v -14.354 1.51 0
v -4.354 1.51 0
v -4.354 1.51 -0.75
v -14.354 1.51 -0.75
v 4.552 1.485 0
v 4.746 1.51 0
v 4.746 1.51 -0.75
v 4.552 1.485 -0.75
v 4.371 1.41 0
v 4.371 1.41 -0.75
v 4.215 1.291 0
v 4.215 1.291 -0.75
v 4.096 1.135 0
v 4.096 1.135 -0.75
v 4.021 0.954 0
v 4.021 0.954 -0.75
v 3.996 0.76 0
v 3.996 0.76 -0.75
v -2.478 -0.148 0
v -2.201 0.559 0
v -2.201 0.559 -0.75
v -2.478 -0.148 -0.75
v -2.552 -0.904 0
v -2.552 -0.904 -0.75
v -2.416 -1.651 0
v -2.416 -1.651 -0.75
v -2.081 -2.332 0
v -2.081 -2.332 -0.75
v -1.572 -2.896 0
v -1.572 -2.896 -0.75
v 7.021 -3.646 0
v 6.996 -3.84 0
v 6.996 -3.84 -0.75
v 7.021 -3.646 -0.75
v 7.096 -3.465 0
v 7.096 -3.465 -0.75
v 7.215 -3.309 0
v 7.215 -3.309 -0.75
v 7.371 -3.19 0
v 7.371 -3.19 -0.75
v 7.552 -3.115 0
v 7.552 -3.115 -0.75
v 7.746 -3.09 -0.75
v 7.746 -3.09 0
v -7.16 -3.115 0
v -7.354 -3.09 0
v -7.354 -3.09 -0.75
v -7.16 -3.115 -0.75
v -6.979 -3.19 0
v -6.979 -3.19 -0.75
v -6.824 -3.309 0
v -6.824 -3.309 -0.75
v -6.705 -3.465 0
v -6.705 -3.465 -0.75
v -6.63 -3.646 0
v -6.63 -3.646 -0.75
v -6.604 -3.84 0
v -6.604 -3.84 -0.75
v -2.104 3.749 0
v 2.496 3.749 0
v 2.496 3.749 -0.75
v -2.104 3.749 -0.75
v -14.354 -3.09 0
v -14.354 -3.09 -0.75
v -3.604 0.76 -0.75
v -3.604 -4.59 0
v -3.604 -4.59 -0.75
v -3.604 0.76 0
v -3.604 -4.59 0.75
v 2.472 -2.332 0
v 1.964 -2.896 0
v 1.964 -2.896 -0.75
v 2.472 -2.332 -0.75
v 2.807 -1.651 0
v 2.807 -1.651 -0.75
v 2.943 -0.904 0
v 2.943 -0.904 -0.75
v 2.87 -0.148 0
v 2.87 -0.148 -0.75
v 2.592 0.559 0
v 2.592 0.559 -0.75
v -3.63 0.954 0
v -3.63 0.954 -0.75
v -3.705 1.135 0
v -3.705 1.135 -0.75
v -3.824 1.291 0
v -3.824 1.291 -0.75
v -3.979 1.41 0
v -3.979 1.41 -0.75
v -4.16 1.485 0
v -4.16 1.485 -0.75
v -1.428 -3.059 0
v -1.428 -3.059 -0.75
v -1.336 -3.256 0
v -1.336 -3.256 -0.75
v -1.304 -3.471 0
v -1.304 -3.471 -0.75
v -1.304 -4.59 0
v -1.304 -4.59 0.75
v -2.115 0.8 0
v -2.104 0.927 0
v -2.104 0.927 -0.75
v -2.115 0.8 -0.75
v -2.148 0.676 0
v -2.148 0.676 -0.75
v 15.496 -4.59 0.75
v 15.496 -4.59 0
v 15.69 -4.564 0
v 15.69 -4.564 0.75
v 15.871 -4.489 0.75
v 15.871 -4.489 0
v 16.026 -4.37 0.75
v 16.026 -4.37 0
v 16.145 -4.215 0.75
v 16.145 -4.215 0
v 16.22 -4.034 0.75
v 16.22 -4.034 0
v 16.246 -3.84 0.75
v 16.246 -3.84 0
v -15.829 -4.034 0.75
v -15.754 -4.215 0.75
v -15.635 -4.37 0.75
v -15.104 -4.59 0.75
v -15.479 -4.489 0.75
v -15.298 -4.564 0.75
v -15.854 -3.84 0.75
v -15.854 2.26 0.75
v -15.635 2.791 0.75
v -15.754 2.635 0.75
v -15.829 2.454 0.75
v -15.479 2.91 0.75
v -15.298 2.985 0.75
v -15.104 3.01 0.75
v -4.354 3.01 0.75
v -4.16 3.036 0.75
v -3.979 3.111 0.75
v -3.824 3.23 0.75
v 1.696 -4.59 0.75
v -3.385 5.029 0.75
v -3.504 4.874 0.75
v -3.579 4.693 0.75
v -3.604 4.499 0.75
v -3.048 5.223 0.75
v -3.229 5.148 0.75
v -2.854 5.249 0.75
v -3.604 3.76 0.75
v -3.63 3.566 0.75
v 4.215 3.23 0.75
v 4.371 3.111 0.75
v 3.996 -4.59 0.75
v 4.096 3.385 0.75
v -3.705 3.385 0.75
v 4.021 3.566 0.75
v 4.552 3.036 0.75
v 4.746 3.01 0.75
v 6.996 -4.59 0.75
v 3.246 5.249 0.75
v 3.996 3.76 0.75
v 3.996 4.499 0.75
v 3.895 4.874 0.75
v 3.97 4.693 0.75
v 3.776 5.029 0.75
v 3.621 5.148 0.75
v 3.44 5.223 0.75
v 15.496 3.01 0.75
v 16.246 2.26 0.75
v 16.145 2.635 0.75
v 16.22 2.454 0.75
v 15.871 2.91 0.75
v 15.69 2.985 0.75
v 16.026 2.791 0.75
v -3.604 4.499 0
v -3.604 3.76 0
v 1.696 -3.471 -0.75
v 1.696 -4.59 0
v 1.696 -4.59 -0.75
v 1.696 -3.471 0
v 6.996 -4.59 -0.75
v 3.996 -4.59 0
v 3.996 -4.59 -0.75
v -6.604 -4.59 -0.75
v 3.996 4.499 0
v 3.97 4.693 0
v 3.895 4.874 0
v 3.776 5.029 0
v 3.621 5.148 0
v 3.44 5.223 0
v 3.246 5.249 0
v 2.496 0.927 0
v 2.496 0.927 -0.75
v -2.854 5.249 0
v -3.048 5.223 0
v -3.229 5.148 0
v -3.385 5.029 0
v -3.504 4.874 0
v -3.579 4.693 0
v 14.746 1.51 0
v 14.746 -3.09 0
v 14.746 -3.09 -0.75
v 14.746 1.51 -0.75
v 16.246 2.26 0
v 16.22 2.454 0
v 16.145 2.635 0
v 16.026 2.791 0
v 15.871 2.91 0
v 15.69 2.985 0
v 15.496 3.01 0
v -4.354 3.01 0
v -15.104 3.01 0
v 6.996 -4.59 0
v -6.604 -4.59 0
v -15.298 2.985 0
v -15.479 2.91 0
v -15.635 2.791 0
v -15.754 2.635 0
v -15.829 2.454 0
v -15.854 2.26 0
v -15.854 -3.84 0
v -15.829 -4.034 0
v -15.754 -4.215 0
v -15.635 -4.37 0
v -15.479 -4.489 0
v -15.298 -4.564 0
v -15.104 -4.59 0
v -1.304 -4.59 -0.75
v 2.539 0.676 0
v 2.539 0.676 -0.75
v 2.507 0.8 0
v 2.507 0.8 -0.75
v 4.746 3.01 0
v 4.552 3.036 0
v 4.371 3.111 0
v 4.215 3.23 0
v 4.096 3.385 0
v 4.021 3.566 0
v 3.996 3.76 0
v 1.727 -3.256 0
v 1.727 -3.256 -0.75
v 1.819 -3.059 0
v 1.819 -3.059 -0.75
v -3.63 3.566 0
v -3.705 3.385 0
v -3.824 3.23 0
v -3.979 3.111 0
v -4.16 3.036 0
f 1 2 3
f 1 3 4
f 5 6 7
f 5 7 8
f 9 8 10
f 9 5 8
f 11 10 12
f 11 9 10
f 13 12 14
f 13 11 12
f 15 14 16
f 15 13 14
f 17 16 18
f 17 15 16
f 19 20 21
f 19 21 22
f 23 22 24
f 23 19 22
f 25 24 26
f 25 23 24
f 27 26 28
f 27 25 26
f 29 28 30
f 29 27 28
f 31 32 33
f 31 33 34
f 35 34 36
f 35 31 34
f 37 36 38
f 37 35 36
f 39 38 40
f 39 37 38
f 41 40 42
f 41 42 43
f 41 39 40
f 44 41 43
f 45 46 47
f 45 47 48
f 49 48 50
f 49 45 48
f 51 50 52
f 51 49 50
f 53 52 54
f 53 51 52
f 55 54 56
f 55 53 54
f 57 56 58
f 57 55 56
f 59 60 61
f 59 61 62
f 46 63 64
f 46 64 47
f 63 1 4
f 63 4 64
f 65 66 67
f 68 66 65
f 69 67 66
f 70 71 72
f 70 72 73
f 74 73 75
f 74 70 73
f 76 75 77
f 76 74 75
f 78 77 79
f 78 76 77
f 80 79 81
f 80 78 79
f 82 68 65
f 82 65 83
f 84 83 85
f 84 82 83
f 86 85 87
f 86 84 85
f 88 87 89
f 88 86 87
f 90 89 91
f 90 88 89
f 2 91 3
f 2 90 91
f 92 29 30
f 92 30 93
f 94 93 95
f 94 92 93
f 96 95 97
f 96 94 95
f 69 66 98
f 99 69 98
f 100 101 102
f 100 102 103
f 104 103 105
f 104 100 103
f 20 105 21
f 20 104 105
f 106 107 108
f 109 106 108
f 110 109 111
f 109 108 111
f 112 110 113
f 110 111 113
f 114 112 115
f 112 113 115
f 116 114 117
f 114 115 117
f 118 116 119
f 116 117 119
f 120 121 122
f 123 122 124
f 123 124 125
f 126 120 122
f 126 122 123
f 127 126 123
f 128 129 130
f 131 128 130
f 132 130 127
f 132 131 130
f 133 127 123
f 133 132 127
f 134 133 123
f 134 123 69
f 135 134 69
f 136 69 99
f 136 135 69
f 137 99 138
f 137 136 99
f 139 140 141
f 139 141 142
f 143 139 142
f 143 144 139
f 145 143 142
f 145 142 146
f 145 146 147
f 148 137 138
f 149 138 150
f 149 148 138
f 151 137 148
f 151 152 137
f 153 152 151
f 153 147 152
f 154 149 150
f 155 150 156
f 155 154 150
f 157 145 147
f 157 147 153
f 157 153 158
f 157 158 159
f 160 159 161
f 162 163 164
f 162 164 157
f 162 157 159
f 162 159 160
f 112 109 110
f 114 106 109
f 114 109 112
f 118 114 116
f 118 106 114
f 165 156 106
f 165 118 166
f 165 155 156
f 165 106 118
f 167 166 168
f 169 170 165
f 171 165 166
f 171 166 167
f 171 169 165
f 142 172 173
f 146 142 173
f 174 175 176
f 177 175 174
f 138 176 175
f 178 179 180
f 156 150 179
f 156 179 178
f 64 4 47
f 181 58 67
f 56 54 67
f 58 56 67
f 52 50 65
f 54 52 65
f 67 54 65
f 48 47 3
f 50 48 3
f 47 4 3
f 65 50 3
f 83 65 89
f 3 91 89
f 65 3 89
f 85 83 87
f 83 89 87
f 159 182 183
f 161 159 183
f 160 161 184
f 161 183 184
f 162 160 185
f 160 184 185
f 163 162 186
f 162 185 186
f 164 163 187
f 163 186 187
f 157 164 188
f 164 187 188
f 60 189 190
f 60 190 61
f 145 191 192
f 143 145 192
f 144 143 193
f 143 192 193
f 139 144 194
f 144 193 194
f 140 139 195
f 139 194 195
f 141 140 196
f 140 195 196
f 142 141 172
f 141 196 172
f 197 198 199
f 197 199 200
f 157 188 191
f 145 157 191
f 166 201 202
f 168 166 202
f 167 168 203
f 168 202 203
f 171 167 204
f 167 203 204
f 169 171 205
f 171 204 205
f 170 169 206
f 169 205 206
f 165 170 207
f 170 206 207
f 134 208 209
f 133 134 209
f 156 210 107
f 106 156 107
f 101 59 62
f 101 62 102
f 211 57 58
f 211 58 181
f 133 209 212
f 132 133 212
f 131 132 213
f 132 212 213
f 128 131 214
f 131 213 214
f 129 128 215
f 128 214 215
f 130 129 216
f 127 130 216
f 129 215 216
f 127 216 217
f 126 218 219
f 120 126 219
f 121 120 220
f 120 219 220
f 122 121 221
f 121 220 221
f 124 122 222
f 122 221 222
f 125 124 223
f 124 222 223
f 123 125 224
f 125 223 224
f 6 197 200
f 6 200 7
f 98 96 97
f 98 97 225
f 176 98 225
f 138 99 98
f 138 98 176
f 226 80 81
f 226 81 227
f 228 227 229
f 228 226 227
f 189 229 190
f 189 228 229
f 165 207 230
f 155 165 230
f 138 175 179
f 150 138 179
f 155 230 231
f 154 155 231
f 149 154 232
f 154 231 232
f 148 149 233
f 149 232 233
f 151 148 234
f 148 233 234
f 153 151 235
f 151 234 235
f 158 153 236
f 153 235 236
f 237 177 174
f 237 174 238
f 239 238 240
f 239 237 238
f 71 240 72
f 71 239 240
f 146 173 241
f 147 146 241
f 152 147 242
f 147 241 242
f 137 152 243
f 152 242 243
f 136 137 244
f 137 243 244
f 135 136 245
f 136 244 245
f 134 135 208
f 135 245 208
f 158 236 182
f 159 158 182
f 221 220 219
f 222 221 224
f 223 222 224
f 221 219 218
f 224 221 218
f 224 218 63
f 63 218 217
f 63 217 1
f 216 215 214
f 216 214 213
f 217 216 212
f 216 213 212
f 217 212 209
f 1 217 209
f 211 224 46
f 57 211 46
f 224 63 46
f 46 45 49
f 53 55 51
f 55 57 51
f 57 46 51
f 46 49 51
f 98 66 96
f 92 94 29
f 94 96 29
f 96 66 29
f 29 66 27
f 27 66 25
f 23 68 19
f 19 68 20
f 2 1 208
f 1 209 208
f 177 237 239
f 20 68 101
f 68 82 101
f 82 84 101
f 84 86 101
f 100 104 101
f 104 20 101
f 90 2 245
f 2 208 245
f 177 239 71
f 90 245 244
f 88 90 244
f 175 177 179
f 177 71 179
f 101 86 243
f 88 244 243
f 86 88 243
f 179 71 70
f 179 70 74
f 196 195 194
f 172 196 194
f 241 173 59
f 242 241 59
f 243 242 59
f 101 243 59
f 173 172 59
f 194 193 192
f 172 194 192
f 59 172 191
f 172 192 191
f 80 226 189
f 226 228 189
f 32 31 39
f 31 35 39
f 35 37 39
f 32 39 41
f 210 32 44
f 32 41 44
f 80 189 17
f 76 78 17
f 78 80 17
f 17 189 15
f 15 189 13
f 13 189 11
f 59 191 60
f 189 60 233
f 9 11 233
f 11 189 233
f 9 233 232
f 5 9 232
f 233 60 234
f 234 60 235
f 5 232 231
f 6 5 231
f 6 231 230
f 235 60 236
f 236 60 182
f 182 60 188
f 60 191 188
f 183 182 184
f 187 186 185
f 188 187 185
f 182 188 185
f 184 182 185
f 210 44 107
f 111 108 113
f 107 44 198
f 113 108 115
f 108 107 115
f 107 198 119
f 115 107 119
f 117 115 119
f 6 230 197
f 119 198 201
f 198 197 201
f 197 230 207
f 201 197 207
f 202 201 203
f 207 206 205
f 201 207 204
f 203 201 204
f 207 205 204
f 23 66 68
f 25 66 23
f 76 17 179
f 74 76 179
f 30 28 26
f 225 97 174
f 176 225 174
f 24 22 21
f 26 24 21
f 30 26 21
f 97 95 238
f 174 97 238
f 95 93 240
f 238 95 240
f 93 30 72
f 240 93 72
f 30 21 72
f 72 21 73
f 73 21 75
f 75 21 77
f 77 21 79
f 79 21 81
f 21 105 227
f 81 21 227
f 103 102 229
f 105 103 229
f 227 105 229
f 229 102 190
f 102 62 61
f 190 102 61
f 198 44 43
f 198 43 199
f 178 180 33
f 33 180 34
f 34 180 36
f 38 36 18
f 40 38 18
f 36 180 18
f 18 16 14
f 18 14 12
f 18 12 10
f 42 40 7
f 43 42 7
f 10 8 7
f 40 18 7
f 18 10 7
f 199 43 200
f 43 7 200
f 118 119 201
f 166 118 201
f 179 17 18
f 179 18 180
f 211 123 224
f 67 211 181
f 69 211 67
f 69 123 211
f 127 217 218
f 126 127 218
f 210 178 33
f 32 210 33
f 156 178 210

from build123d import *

# Parameters (mm, degrees)
F1_DEPTH = 0.75
F2_DEPTH = 0.75


# Not quite as in the source:
# - ends of sketch curves that miss each other by under 0.0002 mm in the source are joined


with BuildPart() as f1:
    # F0 (on Top) → F1 (new body)
    with BuildSketch(Plane.XY):
        with BuildLine():
            Line((-4.3542903055, 3.0103204122), (-15.1042902548, 3.0103204122))
            ThreePointArc((-15.1042902548, 3.0103204122), (-15.634620706, 2.7906503467), (-15.8542907714, 2.2603198956))
            Line((-15.8542907714, 2.2603198956), (-15.8542907714, -3.8396952234))
            ThreePointArc((-15.8542907714, -3.8396952234), (-15.634620706, -4.3700256746), (-15.1042902548, -4.58969574))
            Line((-15.1042902548, -4.58969574), (-6.6042903055, -4.58969574))
            Line((-6.6042903055, -4.58969574), (-6.6042903055, -3.8396876639))
            ThreePointArc((-6.6042903055, -3.8396876639), (-6.8239602196, -3.309357578), (-7.3542903055, -3.0896876639))
            Line((-7.3542903055, -3.0896876639), (-14.3542907714, -3.0896876639))
            Line((-14.3542907714, -3.0896876639), (-14.3542907714, 1.5103194803))
            Line((-14.3542907714, 1.5103194803), (-4.3542898395, 1.5103132679))
            ThreePointArc((-4.3542898395, 1.5103132679), (-3.8239600548, 1.2906431891), (-3.6042903055, 0.7603132679))
            Line((-3.6042903055, 0.7603132679), (-3.6042903055, -4.5896876639))
            Line((-3.6042903055, -4.5896876639), (-1.3042907714, -4.58969574))
            Line((-1.3042907714, -4.58969574), (-1.3042907714, -3.4706392285))
            ThreePointArc((-1.3042907714, -3.4706392285), (-1.3745455835, -3.153706188), (-1.5721480592, -2.8961492966))
            ThreePointArc((-1.5721480592, -2.8961492966), (-2.5098893785, -1.2818626098), (-2.2007190289, 0.5592495498))
            ThreePointArc((-2.2007190289, 0.5592495498), (-2.1287979009, 0.7369818479), (-2.1042903055, 0.9271417706))
            Line((-2.1042903055, 0.9271417706), (-2.1042903055, 3.7487632608))
            Line((-2.1042903055, 3.7487632608), (2.4957087627, 3.7487632608))
            Line((2.4957087627, 3.7487632608), (2.4957087627, 0.9271417706))
            ThreePointArc((2.4957087627, 0.9271417706), (2.5202163581, 0.7369818479), (2.5921374862, 0.5592495498))
            ThreePointArc((2.5921374862, 0.5592495498), (2.9013078357, -1.2818626098), (1.9635665164, -2.8961492966))
            ThreePointArc((1.9635665164, -2.8961492966), (1.7659640407, -3.153706188), (1.6957092286, -3.4706392285))
            Line((1.6957092286, -3.4706392285), (1.6957092286, -4.5896876639))
            Line((1.6957092286, -4.5896876639), (3.9957149822, -4.58969574))
            Line((3.9957149822, -4.58969574), (3.9957116586, 0.7603127188))
            ThreePointArc((3.9957116586, 0.7603127188), (4.2153814061, 1.290643318), (4.7457117418, 1.5103137014))
            Line((4.7457117418, 1.5103137014), (14.7457092286, 1.5103194803))
            Line((14.7457092286, 1.5103194803), (14.7457092286, -3.0896876639))
            Line((14.7457092286, -3.0896876639), (7.7457154989, -3.0896876639))
            ThreePointArc((7.7457154989, -3.0896876639), (7.2153850477, -3.3093577293), (6.9957149822, -3.8396881805))
            Line((6.9957149822, -3.8396881805), (6.9957149822, -4.5896876639))
            Line((6.9957149822, -4.5896876639), (15.495708712, -4.58969574))
            ThreePointArc((15.495708712, -4.58969574), (16.0260391632, -4.3700256746), (16.2457092286, -3.8396952234))
            Line((16.2457092286, -3.8396952234), (16.2457092286, 2.2603198956))
            ThreePointArc((16.2457092286, 2.2603198956), (16.0260391632, 2.7906503467), (15.495708712, 3.0103204122))
            Line((15.495708712, 3.0103204122), (4.7457149822, 3.0103204122))
            ThreePointArc((4.7457149822, 3.0103204122), (4.2153848964, 3.2299903263), (3.9957149822, 3.7603204122))
            Line((3.9957149822, 3.7603204122), (3.9957149822, 4.4987632608))
            ThreePointArc((3.9957149822, 4.4987632608), (3.7760450681, 5.0290933467), (3.2457149822, 5.2487632608))
            Line((3.2457149822, 5.2487632608), (-2.8542903055, 5.2487632608))
            ThreePointArc((-2.8542903055, 5.2487632608), (-3.3846203913, 5.0290933467), (-3.6042903055, 4.4987632608))
            Line((-3.6042903055, 4.4987632608), (-3.6042903055, 3.7603204122))
            ThreePointArc((-3.6042903055, 3.7603204122), (-3.8239602196, 3.2299903263), (-4.3542903055, 3.0103204122))
        make_face()
        with BuildLine():
            Line((-6.6042903055, -3.8396876639), (-6.6042903055, -4.58969574))
            Line((-6.6042903055, -4.58969574), (-3.6042903055, -4.58969574))
            Line((-3.6042903055, -4.58969574), (-3.6042903055, 0.7603132679))
            ThreePointArc((-3.6042903055, 0.7603132679), (-3.8239600548, 1.2906431891), (-4.3542898395, 1.5103132679))
            Line((-4.3542898395, 1.5103132679), (-14.3542907714, 1.5103194803))
            Line((-14.3542907714, 1.5103194803), (-14.3542907714, -3.0896876639))
            Line((-14.3542907714, -3.0896876639), (-7.3542903055, -3.0896876639))
            ThreePointArc((-7.3542903055, -3.0896876639), (-6.8239602196, -3.309357578), (-6.6042903055, -3.8396876639))
        make_face()
        with BuildLine():
            Line((3.9957116586, 0.7603127188), (3.9957149822, -4.5896876639))
            Line((3.9957149822, -4.5896876639), (6.9957149822, -4.58969574))
            Line((6.9957149822, -4.58969574), (6.9957149822, -3.8396881805))
            ThreePointArc((6.9957149822, -3.8396881805), (7.2153850477, -3.3093577293), (7.7457154989, -3.0896876639))
            Line((7.7457154989, -3.0896876639), (14.7457092286, -3.0896876639))
            Line((14.7457092286, -3.0896876639), (14.7457092286, 1.5103194803))
            Line((14.7457092286, 1.5103194803), (4.7457117418, 1.5103137014))
            ThreePointArc((4.7457117418, 1.5103137014), (4.2153814061, 1.290643318), (3.9957116586, 0.7603127188))
        make_face()
        with BuildLine():
            Line((-1.3042907714, -3.4706392285), (-1.3042907714, -4.5896876639))
            Line((-1.3042907714, -4.5896876639), (1.6957092286, -4.58969574))
            Line((1.6957092286, -4.58969574), (1.6957092286, -3.4706392285))
            ThreePointArc((1.6957092286, -3.4706392285), (1.7659640407, -3.153706188), (1.9635665164, -2.8961492966))
            ThreePointArc((1.9635665164, -2.8961492966), (2.9013078357, -1.2818626098), (2.5921374862, 0.5592495498))
            ThreePointArc((2.5921374862, 0.5592495498), (2.5202163581, 0.7369818479), (2.4957087627, 0.9271417706))
            Line((2.4957087627, 0.9271417706), (2.4957087627, 3.7487632608))
            Line((2.4957087627, 3.7487632608), (-2.1042903055, 3.7487632608))
            Line((-2.1042903055, 3.7487632608), (-2.1042903055, 0.9271417706))
            ThreePointArc((-2.1042903055, 0.9271417706), (-2.1287979009, 0.7369818479), (-2.2007190289, 0.5592495498))
            ThreePointArc((-2.2007190289, 0.5592495498), (-2.5098893785, -1.2818626098), (-1.5721480592, -2.8961492966))
            ThreePointArc((-1.5721480592, -2.8961492966), (-1.3745455835, -3.153706188), (-1.3042907714, -3.4706392285))
        make_face()
    extrude(amount=F1_DEPTH)

    # F0 (on Top) → F2 (join)
    with BuildSketch(Plane.XY):
        with BuildLine():
            Line((-6.6042903055, -3.8396876639), (-6.6042903055, -4.58969574))
            Line((-6.6042903055, -4.58969574), (-3.6042903055, -4.58969574))
            Line((-3.6042903055, -4.58969574), (-3.6042903055, 0.7603132679))
            ThreePointArc((-3.6042903055, 0.7603132679), (-3.8239600548, 1.2906431891), (-4.3542898395, 1.5103132679))
            Line((-4.3542898395, 1.5103132679), (-14.3542907714, 1.5103194803))
            Line((-14.3542907714, 1.5103194803), (-14.3542907714, -3.0896876639))
            Line((-14.3542907714, -3.0896876639), (-7.3542903055, -3.0896876639))
            ThreePointArc((-7.3542903055, -3.0896876639), (-6.8239602196, -3.309357578), (-6.6042903055, -3.8396876639))
        make_face()
        with BuildLine():
            Line((-1.3042907714, -3.4706392285), (-1.3042907714, -4.5896876639))
            Line((-1.3042907714, -4.5896876639), (1.6957092286, -4.58969574))
            Line((1.6957092286, -4.58969574), (1.6957092286, -3.4706392285))
            ThreePointArc((1.6957092286, -3.4706392285), (1.7659640407, -3.153706188), (1.9635665164, -2.8961492966))
            ThreePointArc((1.9635665164, -2.8961492966), (2.9013078357, -1.2818626098), (2.5921374862, 0.5592495498))
            ThreePointArc((2.5921374862, 0.5592495498), (2.5202163581, 0.7369818479), (2.4957087627, 0.9271417706))
            Line((2.4957087627, 0.9271417706), (2.4957087627, 3.7487632608))
            Line((2.4957087627, 3.7487632608), (-2.1042903055, 3.7487632608))
            Line((-2.1042903055, 3.7487632608), (-2.1042903055, 0.9271417706))
            ThreePointArc((-2.1042903055, 0.9271417706), (-2.1287979009, 0.7369818479), (-2.2007190289, 0.5592495498))
            ThreePointArc((-2.2007190289, 0.5592495498), (-2.5098893785, -1.2818626098), (-1.5721480592, -2.8961492966))
            ThreePointArc((-1.5721480592, -2.8961492966), (-1.3745455835, -3.153706188), (-1.3042907714, -3.4706392285))
        make_face()
        with BuildLine():
            Line((3.9957116586, 0.7603127188), (3.9957149822, -4.5896876639))
            Line((3.9957149822, -4.5896876639), (6.9957149822, -4.58969574))
            Line((6.9957149822, -4.58969574), (6.9957149822, -3.8396881805))
            ThreePointArc((6.9957149822, -3.8396881805), (7.2153850477, -3.3093577293), (7.7457154989, -3.0896876639))
            Line((7.7457154989, -3.0896876639), (14.7457092286, -3.0896876639))
            Line((14.7457092286, -3.0896876639), (14.7457092286, 1.5103194803))
            Line((14.7457092286, 1.5103194803), (4.7457117418, 1.5103137014))
            ThreePointArc((4.7457117418, 1.5103137014), (4.2153814061, 1.290643318), (3.9957116586, 0.7603127188))
        make_face()
    extrude(amount=-F2_DEPTH)


solid = f1.part
